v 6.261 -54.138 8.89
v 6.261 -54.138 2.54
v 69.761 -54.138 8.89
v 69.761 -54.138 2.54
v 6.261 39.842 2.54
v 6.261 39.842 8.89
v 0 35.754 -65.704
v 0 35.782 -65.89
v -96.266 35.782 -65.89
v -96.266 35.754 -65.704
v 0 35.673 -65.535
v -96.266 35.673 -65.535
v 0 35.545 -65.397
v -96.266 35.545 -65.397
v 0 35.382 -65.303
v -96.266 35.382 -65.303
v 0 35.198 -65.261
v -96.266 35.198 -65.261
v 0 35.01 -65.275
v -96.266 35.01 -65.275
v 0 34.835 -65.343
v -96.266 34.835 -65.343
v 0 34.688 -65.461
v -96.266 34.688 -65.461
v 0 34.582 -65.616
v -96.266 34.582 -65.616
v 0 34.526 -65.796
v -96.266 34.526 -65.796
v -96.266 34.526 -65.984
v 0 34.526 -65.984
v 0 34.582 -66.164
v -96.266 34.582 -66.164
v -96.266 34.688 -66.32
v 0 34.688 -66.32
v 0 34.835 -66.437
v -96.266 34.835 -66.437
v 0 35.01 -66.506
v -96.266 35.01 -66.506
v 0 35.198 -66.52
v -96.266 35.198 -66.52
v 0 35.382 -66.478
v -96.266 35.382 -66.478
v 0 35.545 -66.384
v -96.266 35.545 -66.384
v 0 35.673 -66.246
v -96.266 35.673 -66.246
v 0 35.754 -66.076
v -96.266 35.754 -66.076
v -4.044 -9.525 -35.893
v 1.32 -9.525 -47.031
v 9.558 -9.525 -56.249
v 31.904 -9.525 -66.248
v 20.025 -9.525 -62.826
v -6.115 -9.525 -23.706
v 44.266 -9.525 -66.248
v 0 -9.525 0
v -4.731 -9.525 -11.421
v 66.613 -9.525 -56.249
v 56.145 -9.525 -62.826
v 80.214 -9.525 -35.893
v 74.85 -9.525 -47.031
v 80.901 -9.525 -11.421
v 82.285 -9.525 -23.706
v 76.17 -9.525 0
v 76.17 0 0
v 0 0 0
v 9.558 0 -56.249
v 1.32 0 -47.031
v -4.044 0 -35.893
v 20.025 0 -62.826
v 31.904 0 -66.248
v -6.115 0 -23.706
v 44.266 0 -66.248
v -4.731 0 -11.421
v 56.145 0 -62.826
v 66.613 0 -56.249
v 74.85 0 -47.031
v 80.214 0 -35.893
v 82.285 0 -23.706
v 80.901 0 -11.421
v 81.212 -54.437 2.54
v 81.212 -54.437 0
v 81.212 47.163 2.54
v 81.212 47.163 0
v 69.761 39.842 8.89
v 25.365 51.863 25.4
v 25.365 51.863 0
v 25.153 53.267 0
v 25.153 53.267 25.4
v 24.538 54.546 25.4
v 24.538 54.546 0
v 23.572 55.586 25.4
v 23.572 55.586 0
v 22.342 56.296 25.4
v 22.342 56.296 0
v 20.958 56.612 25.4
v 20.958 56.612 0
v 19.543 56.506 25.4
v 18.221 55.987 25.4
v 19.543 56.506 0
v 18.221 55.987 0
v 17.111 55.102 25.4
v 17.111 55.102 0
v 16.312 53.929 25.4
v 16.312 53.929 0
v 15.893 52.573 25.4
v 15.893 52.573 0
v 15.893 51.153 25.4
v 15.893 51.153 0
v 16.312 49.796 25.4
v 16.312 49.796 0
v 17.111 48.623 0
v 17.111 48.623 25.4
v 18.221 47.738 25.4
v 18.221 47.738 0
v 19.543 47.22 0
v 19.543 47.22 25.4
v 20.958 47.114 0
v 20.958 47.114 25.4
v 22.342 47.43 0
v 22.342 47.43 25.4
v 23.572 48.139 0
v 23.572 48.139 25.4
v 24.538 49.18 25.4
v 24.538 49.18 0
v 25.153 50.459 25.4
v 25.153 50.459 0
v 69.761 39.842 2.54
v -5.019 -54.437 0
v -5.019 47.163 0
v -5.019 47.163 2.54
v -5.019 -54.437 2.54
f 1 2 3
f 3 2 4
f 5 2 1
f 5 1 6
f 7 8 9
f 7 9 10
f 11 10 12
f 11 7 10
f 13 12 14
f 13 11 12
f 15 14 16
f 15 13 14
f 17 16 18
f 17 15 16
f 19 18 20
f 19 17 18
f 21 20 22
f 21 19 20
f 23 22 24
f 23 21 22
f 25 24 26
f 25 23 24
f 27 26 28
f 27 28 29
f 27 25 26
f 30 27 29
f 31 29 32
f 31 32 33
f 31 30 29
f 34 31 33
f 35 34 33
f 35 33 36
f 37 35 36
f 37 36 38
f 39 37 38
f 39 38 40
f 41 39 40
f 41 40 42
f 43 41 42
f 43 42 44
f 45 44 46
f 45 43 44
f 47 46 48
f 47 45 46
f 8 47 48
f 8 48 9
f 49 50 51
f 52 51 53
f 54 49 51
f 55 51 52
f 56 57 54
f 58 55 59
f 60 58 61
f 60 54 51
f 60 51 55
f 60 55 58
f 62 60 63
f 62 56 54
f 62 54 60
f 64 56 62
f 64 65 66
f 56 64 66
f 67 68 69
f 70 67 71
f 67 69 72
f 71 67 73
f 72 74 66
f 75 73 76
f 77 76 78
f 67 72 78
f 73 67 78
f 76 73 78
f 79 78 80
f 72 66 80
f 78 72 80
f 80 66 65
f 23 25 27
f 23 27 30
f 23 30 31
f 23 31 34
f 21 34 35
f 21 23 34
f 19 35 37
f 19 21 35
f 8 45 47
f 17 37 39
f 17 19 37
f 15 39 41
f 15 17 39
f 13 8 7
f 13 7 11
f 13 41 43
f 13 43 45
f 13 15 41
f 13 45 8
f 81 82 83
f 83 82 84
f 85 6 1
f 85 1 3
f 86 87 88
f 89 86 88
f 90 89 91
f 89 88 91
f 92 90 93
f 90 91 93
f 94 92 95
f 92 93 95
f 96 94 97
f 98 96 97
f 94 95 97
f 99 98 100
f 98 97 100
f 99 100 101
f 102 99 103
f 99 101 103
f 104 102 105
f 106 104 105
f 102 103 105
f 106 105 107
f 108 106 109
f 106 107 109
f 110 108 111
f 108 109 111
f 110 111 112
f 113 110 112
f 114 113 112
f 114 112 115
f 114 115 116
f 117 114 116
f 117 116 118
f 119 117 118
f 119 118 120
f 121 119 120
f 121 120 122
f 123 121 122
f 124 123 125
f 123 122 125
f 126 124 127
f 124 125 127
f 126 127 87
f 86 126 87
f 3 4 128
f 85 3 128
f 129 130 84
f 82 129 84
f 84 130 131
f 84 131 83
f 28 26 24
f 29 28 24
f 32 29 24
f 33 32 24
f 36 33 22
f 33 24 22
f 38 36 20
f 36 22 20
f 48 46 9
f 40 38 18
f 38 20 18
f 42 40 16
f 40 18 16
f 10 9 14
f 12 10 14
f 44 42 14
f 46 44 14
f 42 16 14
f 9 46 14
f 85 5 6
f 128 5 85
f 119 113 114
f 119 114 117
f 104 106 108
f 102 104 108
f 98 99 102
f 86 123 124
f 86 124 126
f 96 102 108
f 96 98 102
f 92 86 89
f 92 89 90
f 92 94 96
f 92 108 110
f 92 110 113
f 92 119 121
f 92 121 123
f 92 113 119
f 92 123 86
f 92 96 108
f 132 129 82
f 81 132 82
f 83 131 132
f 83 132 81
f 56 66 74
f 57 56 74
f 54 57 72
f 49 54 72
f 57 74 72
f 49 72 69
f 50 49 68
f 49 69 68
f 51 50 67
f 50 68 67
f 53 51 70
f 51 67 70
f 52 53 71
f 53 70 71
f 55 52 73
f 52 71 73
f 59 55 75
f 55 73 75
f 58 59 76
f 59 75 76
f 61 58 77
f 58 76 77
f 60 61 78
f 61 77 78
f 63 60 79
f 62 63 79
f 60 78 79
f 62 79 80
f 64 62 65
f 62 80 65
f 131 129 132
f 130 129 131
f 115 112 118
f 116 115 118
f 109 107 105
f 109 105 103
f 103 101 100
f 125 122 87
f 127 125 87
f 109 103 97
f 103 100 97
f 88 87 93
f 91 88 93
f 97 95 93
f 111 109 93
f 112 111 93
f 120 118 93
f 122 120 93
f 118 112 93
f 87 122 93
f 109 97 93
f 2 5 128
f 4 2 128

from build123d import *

# Parameters (mm, degrees)
F1_DEPTH = 9.525
F2_W     = 86.231357418
F2_H     = 101.6
F2_W_2   = 76.1702060699
F2_H_2   = 9.525
F3_DEPTH = 2.54
F4_W     = 63.5
F4_H     = 93.98
F5_DEPTH = 6.35
F6_R     = 4.7625
F7_DEPTH = 25.4
F8_R     = 0.6314423054
F9_DEPTH = 96.266


with BuildPart() as f1:
    # F0 (on Front) → F1 (new body)
    with BuildSketch(Plane.XZ):
        with BuildLine():
            Line((76.1702060699, 0), (0, 0))
            ThreePointArc((0, 0), (38.085103035, -66.682218169), (76.1702060699, 0))
        make_face()
    extrude(amount=F1_DEPTH)


with BuildPart() as f3:
    # F2 (on face) → F3 (new body)
    with BuildSketch(Plane.XY):
        with Locations((38.0962812342, -3.637123239)):
            Rectangle(F2_W, F2_H)
        with Locations((38.085103035, -4.7625)):
            Rectangle(F2_W_2, F2_H_2, mode=Mode.SUBTRACT)
        with Locations((38.085103035, -4.7625)):
            Rectangle(F2_W_2, F2_H_2)
    extrude(amount=F3_DEPTH)


with BuildPart() as f5:
    # F4 (on face) → F5 (new body)
    with BuildSketch(Plane.XY.offset(2.54)):
        with Locations((38.0110456608, -7.1483870876)):
            Rectangle(F4_W, F4_H)
    extrude(amount=F5_DEPTH)


with BuildPart() as f7:
    # F6 (on Top) → F7 (new body)
    with BuildSketch(Plane.XY):
        with Locations((20.6025417734, 51.8628093516)):
            Circle(F6_R)
    extrude(amount=F7_DEPTH)


with BuildPart() as f9:
    # F8 (on Right) → F9 (new body)
    with BuildSketch(Plane.YZ):
        with Locations((35.1508595049, -65.8903047442)):
            Circle(F8_R)
    extrude(amount=-F9_DEPTH)


solid = Compound([f1.part, f3.part, f5.part, f7.part, f9.part])
